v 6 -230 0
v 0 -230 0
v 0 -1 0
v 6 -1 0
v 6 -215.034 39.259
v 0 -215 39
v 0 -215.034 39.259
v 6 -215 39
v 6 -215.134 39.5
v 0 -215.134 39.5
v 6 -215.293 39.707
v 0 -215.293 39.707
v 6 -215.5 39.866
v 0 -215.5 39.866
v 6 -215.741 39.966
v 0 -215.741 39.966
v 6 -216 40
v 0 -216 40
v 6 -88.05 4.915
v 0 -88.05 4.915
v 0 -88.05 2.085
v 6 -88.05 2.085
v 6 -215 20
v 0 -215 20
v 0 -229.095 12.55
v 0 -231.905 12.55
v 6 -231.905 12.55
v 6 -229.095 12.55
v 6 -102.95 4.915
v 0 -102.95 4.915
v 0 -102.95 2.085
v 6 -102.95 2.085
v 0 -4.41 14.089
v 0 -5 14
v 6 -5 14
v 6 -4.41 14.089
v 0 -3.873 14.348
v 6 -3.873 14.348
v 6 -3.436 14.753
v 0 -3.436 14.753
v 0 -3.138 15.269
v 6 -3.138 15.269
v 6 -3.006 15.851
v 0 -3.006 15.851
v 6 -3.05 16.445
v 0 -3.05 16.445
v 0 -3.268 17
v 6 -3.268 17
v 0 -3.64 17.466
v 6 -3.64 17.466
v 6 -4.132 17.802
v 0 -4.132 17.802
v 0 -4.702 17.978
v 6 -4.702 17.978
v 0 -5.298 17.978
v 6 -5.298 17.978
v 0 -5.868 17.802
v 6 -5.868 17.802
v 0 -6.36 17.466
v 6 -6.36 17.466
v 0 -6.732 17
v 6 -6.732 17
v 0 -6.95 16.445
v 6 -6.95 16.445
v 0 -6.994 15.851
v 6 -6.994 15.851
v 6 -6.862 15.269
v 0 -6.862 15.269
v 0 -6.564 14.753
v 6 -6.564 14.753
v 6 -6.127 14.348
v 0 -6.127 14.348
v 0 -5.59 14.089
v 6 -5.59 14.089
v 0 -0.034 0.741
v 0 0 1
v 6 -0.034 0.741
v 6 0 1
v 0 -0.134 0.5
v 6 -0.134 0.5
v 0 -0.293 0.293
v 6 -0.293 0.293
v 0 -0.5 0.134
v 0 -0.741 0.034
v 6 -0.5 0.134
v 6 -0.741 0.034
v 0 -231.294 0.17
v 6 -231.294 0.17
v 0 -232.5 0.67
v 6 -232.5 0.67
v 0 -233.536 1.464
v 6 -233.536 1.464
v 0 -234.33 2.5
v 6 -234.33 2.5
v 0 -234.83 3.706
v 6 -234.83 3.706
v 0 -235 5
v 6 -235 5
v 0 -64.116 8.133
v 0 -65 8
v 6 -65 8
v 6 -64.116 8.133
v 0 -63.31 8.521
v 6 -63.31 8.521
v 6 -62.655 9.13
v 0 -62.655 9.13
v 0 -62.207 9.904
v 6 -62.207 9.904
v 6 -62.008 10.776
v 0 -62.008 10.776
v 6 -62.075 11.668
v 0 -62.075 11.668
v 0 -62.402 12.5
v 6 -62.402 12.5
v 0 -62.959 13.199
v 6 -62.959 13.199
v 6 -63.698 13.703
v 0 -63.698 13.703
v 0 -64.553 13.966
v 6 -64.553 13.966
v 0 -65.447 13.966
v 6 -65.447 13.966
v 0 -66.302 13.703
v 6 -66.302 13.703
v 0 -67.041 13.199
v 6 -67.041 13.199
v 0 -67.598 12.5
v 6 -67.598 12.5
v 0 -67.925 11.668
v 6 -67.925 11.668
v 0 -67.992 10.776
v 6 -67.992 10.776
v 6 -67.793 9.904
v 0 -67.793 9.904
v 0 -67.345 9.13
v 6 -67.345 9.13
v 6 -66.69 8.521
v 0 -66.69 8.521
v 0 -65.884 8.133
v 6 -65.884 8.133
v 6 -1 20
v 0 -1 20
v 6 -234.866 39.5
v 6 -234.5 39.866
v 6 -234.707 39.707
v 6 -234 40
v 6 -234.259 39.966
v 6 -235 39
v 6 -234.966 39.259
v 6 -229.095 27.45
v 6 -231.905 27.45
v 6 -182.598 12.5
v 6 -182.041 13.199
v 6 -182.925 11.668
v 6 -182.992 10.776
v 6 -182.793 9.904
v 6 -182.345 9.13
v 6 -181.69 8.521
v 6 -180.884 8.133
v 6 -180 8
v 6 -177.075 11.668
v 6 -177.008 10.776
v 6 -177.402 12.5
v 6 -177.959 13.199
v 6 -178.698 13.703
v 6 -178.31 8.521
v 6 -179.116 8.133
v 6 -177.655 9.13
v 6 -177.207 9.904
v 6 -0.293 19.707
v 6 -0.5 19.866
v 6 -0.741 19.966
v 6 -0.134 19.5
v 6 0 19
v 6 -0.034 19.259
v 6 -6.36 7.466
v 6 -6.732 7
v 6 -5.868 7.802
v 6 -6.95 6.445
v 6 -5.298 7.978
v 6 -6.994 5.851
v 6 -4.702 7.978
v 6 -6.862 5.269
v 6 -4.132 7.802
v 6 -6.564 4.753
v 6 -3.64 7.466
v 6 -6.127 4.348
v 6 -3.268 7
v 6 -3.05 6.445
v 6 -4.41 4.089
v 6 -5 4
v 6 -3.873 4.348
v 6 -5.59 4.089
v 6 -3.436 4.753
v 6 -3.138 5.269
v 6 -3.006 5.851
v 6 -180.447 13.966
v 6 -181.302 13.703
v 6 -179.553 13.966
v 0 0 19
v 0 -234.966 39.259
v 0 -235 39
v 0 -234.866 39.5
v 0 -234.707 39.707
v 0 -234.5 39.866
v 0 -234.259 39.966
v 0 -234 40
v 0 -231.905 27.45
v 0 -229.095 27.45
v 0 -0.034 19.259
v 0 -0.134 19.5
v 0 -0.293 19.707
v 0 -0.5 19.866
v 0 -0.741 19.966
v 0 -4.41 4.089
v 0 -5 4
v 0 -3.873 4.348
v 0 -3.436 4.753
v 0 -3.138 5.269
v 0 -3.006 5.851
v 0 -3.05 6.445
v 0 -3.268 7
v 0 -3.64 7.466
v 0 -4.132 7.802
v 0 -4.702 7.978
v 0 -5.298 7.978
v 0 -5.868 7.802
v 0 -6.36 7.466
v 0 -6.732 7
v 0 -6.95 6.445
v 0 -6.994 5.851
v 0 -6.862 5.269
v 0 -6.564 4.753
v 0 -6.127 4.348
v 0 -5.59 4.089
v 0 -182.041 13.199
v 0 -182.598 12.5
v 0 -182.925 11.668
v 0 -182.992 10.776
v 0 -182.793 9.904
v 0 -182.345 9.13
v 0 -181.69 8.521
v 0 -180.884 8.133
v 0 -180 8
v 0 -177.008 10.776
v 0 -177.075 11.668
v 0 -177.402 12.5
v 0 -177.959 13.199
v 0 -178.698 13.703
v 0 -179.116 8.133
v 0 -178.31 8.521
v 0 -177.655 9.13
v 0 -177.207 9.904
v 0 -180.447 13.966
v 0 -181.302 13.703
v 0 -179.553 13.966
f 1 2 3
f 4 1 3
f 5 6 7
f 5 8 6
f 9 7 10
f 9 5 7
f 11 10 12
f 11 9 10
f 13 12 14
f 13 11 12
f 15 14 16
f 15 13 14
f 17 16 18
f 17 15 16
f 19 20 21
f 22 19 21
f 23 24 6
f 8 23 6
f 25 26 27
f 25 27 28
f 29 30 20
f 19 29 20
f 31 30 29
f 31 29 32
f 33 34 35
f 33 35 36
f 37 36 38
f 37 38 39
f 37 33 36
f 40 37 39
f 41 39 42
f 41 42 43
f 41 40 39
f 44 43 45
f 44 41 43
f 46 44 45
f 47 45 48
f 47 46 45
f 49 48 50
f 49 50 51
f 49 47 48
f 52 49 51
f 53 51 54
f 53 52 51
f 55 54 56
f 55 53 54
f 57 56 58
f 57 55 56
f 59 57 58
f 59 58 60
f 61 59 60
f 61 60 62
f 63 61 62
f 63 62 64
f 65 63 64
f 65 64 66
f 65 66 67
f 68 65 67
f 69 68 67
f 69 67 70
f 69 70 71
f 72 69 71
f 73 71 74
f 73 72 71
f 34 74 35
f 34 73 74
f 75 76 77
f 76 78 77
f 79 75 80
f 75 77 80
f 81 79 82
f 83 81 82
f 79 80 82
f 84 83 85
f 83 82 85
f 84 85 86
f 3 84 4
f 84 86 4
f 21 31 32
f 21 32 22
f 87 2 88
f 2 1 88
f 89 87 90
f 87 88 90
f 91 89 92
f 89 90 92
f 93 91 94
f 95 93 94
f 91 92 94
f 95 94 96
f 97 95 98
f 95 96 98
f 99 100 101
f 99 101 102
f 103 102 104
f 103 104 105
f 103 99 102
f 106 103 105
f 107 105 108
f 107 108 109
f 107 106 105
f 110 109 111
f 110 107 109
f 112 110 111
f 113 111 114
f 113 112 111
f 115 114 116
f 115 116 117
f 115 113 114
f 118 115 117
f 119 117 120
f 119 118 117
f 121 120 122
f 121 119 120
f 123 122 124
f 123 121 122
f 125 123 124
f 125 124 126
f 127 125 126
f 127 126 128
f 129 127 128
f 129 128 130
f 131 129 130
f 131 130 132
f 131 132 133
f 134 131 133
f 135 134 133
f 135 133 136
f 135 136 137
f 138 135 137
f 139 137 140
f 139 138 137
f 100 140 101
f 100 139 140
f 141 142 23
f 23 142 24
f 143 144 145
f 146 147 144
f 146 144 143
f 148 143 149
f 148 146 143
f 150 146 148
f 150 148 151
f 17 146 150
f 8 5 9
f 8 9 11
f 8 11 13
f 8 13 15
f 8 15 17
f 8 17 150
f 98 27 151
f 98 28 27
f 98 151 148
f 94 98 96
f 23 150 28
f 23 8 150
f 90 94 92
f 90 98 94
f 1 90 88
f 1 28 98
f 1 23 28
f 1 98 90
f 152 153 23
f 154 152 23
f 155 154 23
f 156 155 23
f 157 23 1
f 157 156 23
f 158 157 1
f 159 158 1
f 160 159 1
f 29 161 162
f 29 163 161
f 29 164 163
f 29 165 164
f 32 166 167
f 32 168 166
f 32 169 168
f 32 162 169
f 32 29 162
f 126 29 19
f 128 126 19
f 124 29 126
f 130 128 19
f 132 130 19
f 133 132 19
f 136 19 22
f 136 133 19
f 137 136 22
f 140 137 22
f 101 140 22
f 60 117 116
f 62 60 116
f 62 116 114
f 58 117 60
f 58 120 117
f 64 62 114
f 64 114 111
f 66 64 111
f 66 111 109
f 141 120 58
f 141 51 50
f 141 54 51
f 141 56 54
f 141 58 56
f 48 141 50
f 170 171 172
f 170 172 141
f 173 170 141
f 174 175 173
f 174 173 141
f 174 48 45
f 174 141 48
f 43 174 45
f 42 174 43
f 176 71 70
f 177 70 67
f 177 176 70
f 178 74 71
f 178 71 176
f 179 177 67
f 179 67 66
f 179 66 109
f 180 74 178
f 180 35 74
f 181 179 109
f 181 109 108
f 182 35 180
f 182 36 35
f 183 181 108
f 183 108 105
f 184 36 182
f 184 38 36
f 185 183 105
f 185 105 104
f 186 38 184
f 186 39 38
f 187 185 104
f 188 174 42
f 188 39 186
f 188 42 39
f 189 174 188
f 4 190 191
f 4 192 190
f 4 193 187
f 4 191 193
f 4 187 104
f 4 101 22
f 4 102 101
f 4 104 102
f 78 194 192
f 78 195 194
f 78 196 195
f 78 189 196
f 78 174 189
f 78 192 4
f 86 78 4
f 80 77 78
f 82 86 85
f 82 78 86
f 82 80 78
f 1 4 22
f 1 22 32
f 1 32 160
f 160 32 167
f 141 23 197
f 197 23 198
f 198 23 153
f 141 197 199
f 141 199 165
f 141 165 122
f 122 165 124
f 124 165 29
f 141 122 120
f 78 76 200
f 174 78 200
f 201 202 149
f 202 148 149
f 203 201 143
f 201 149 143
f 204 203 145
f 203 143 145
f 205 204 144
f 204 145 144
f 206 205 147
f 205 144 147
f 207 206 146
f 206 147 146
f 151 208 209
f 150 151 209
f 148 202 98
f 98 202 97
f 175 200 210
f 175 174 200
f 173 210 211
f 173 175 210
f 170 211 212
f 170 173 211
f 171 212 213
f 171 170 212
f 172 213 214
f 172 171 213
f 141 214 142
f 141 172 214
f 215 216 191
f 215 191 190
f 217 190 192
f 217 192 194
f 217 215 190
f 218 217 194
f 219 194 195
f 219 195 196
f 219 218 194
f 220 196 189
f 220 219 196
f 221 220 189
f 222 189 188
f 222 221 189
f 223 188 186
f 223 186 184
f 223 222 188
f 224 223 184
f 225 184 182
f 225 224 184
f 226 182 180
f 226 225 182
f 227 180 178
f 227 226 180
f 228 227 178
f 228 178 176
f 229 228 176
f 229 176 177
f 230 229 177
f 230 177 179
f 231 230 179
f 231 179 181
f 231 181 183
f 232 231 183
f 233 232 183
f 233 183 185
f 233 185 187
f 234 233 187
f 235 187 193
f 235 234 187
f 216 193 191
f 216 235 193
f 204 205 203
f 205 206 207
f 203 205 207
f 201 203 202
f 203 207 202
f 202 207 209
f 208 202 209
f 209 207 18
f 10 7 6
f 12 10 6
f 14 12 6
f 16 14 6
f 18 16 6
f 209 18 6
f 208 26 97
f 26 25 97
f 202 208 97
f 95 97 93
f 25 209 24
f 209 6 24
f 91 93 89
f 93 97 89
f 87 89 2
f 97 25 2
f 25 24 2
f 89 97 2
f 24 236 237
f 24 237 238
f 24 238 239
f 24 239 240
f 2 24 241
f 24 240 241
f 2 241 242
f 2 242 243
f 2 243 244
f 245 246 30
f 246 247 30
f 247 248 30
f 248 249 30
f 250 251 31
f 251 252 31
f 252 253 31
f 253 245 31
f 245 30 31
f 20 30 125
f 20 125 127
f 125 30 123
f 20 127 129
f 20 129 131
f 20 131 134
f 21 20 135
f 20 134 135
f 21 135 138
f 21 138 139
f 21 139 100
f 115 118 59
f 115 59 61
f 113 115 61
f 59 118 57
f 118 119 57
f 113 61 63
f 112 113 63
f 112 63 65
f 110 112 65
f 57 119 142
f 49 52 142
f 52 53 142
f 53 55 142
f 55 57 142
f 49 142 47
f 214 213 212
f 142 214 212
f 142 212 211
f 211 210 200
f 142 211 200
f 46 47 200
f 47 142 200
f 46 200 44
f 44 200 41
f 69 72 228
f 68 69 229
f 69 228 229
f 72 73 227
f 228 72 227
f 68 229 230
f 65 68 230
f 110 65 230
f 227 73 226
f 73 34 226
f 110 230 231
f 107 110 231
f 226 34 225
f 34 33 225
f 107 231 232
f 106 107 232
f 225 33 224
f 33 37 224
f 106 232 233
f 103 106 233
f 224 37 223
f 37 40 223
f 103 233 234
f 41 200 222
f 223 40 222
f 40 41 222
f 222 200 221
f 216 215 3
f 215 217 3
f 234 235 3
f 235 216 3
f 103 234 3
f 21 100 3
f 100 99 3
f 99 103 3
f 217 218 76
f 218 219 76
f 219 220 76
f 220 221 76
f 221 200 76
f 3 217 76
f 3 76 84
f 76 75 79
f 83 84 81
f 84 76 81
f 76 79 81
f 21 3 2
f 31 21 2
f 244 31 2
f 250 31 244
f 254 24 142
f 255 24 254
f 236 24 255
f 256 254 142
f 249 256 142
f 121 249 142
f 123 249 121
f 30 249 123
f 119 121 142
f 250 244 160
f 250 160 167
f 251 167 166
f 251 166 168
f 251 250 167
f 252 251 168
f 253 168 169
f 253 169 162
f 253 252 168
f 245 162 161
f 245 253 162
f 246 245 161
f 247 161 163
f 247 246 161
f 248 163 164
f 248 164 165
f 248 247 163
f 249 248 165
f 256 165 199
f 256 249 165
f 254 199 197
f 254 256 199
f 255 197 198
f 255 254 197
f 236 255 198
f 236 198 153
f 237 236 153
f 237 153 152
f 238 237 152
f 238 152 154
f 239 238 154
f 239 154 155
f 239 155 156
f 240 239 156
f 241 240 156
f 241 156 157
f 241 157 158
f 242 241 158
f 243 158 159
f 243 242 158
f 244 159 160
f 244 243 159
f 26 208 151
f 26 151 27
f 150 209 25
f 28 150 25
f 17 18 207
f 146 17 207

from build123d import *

# Parameters (mm, degrees)
SKETCH_1_R      = 2
SKETCH_1_R_2    = 3
SKETCH_1_W      = 14.9
SKETCH_1_H      = 2.81
SKETCH_1_W_2    = 2.83
SKETCH_1_H_2    = 14.9
EXTRUDE_1_DEPTH = 6
FILLET_1_R      = 1
FILLET_2_R      = 5


with BuildPart() as part:
    # Эскиз1 → Бобышка-Вытянуть1 (new body)
    with BuildSketch(Plane(origin=(0, 0, 0), x_dir=(0, 0, -1), z_dir=(1, 0, 0))):
        Polygon((0, 0), (-20, 0), (-20, -215), (-40, -215), (-40, -235), (0, -235), align=None)
        with Locations((-16, -5)):
            Circle(SKETCH_1_R, mode=Mode.SUBTRACT)
        with Locations((-6, -5)):
            Circle(SKETCH_1_R, mode=Mode.SUBTRACT)
        with Locations((-11, -65)):
            Circle(SKETCH_1_R_2, mode=Mode.SUBTRACT)
        with Locations((-11, -180)):
            Circle(SKETCH_1_R_2, mode=Mode.SUBTRACT)
        with Locations((-20, -230.5)):
            Rectangle(SKETCH_1_W, SKETCH_1_H, mode=Mode.SUBTRACT)
        with Locations((-3.5, -95.5)):
            Rectangle(SKETCH_1_W_2, SKETCH_1_H_2, mode=Mode.SUBTRACT)
    extrude(amount=EXTRUDE_1_DEPTH)

    # Скругление1
    fillet_1_edges = [part.edges().sort_by_distance(p)[0] for p in [
        (3, -235, 40),
        (3, -215, 40),
        (3, 0, 20),
        (3, 0, 0),
    ]]
    fillet(fillet_1_edges, radius=FILLET_1_R)

    # Скругление2
    fillet_2_edges = [part.edges().sort_by_distance(p)[0] for p in [
        (3, -235, 0),
    ]]
    fillet(fillet_2_edges, radius=FILLET_2_R)


solid = part.part
